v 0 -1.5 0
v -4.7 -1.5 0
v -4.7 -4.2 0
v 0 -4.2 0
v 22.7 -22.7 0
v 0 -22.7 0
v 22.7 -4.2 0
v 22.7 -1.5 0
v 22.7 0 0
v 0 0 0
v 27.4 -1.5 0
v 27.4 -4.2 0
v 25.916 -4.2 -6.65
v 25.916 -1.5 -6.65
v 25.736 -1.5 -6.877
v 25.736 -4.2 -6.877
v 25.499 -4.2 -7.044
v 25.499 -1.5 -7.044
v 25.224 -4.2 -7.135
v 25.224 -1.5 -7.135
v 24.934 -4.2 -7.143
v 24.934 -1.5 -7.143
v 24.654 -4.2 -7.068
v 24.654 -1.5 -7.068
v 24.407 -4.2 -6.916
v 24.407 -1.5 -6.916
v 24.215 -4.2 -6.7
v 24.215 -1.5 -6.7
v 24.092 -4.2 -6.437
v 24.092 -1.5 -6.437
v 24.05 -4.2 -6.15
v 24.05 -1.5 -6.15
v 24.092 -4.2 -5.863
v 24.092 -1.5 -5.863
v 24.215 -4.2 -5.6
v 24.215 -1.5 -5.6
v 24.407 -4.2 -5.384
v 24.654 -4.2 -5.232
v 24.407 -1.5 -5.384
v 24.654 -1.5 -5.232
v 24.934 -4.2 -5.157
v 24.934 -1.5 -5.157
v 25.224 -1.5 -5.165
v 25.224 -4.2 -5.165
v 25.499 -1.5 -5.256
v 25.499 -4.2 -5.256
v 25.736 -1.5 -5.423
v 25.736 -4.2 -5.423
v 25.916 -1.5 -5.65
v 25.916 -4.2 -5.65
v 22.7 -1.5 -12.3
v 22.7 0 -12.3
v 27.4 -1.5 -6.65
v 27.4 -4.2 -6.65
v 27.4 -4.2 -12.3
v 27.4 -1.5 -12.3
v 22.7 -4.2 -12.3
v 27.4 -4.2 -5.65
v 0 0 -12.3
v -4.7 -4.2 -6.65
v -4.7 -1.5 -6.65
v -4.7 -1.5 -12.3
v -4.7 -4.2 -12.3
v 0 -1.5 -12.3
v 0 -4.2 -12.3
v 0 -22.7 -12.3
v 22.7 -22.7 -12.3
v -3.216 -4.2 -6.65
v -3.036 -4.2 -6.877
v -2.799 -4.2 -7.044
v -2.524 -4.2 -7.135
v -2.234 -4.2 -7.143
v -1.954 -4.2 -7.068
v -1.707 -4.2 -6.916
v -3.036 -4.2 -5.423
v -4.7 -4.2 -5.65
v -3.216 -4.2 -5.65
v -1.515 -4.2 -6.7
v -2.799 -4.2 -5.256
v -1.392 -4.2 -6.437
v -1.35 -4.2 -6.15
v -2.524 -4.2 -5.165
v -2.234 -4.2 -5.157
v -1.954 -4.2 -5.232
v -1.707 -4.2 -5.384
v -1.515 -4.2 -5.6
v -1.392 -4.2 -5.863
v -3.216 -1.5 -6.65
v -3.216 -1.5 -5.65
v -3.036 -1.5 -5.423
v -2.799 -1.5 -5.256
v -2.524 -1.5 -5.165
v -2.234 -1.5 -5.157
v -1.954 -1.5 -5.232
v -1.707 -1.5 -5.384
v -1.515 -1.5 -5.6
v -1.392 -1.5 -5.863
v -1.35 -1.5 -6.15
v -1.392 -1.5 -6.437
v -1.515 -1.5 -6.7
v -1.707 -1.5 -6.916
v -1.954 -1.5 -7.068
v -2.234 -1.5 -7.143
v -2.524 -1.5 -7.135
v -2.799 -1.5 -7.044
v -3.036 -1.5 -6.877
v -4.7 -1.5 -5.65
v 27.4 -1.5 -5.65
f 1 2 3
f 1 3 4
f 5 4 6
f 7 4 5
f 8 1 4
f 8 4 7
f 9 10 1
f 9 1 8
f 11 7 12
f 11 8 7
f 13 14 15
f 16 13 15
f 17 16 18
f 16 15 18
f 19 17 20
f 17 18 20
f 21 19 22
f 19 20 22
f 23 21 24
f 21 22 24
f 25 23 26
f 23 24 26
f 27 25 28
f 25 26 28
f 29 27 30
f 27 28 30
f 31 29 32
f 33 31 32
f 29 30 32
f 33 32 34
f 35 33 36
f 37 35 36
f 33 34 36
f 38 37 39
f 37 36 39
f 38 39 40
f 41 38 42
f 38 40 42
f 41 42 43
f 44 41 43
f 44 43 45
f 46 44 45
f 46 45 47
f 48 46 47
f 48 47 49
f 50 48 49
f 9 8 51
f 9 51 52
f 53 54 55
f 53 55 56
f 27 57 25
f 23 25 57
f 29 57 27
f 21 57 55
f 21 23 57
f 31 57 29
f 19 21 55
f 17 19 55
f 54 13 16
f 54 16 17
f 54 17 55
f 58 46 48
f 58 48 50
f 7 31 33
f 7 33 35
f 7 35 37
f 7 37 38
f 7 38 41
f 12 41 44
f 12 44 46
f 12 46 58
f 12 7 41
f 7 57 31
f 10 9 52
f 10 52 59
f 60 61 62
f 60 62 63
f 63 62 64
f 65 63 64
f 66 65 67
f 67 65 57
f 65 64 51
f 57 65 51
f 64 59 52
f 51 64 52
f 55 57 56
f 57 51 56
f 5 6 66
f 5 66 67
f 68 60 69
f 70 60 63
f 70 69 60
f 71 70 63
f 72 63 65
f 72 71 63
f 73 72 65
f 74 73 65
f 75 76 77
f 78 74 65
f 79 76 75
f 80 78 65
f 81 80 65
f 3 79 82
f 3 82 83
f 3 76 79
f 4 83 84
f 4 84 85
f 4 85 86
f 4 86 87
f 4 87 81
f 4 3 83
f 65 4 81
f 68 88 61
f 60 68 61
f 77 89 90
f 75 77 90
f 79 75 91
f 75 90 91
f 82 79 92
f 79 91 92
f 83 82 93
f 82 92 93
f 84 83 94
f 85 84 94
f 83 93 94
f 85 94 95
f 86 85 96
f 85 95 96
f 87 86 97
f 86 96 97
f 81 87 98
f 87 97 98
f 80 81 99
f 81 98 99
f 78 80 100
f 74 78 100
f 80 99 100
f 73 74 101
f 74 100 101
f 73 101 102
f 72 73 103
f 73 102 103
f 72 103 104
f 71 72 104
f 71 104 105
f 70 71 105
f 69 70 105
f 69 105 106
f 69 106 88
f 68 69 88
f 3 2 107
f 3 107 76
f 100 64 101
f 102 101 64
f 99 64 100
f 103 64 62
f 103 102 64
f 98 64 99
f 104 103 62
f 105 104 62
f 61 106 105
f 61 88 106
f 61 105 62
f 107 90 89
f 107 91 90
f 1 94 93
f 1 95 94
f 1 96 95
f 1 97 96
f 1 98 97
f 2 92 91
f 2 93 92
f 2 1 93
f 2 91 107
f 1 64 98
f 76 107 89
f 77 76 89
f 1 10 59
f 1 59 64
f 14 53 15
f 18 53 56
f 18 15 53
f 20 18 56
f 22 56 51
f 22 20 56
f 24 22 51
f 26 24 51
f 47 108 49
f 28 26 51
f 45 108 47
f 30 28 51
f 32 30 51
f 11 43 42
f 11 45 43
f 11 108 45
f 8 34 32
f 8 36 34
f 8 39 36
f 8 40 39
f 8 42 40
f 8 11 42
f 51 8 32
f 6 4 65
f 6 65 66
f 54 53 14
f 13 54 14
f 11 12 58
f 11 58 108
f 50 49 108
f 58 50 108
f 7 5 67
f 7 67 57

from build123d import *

# Parameters (mm, degrees)
EXTRUSION2_CUT_DEPTH = 12.3
EXTRUSION1_DEPTH     = 12.3


with BuildPart() as extrusion2_cut:
    # Sketch2_bp → Extrusion2_Cut (new body)
    with BuildSketch(Plane(origin=(22.7, -1.5, 0), x_dir=(1, 0, 0), z_dir=(0, 1, 0))):
        with BuildLine():
            Line((-25.916025, 6.65), (-27.4, 6.65))
            Line((-27.4, 6.65), (-27.4, 5.65))
            Line((-27.4, 5.65), (-25.916025, 5.65))
            ThreePointArc((-25.916025, 5.65), (-24.05, 6.15), (-25.916025, 6.65))
        make_face()
        with BuildLine():
            Line((3.216025, 5.65), (4.7, 5.65))
            Line((4.7, 5.65), (4.7, 6.65))
            Line((4.7, 6.65), (3.216025, 6.65))
            ThreePointArc((3.216025, 6.65), (1.35, 6.15), (3.216025, 5.65))
        make_face()
    extrude(amount=-EXTRUSION2_CUT_DEPTH)


with BuildPart() as extrusion2:
    # Sketch1_bp → Extrusion1 (new body)
    with BuildSketch(Plane.XY):
        Polygon((22.7, -22.7), (22.7, -4.2), (27.4, -4.2), (27.4, -1.5), (22.7, -1.5), (22.7, 0), (0, 0), (0, -1.5), (-4.7, -1.5), (-4.7, -4.2), (0, -4.2), (0, -22.7), align=None)
    extrude(amount=-EXTRUSION1_DEPTH)

    # Extrusion2: cut Extrusion2_Cut
    add(extrusion2_cut.part, mode=Mode.SUBTRACT)


solid = extrusion2.part
